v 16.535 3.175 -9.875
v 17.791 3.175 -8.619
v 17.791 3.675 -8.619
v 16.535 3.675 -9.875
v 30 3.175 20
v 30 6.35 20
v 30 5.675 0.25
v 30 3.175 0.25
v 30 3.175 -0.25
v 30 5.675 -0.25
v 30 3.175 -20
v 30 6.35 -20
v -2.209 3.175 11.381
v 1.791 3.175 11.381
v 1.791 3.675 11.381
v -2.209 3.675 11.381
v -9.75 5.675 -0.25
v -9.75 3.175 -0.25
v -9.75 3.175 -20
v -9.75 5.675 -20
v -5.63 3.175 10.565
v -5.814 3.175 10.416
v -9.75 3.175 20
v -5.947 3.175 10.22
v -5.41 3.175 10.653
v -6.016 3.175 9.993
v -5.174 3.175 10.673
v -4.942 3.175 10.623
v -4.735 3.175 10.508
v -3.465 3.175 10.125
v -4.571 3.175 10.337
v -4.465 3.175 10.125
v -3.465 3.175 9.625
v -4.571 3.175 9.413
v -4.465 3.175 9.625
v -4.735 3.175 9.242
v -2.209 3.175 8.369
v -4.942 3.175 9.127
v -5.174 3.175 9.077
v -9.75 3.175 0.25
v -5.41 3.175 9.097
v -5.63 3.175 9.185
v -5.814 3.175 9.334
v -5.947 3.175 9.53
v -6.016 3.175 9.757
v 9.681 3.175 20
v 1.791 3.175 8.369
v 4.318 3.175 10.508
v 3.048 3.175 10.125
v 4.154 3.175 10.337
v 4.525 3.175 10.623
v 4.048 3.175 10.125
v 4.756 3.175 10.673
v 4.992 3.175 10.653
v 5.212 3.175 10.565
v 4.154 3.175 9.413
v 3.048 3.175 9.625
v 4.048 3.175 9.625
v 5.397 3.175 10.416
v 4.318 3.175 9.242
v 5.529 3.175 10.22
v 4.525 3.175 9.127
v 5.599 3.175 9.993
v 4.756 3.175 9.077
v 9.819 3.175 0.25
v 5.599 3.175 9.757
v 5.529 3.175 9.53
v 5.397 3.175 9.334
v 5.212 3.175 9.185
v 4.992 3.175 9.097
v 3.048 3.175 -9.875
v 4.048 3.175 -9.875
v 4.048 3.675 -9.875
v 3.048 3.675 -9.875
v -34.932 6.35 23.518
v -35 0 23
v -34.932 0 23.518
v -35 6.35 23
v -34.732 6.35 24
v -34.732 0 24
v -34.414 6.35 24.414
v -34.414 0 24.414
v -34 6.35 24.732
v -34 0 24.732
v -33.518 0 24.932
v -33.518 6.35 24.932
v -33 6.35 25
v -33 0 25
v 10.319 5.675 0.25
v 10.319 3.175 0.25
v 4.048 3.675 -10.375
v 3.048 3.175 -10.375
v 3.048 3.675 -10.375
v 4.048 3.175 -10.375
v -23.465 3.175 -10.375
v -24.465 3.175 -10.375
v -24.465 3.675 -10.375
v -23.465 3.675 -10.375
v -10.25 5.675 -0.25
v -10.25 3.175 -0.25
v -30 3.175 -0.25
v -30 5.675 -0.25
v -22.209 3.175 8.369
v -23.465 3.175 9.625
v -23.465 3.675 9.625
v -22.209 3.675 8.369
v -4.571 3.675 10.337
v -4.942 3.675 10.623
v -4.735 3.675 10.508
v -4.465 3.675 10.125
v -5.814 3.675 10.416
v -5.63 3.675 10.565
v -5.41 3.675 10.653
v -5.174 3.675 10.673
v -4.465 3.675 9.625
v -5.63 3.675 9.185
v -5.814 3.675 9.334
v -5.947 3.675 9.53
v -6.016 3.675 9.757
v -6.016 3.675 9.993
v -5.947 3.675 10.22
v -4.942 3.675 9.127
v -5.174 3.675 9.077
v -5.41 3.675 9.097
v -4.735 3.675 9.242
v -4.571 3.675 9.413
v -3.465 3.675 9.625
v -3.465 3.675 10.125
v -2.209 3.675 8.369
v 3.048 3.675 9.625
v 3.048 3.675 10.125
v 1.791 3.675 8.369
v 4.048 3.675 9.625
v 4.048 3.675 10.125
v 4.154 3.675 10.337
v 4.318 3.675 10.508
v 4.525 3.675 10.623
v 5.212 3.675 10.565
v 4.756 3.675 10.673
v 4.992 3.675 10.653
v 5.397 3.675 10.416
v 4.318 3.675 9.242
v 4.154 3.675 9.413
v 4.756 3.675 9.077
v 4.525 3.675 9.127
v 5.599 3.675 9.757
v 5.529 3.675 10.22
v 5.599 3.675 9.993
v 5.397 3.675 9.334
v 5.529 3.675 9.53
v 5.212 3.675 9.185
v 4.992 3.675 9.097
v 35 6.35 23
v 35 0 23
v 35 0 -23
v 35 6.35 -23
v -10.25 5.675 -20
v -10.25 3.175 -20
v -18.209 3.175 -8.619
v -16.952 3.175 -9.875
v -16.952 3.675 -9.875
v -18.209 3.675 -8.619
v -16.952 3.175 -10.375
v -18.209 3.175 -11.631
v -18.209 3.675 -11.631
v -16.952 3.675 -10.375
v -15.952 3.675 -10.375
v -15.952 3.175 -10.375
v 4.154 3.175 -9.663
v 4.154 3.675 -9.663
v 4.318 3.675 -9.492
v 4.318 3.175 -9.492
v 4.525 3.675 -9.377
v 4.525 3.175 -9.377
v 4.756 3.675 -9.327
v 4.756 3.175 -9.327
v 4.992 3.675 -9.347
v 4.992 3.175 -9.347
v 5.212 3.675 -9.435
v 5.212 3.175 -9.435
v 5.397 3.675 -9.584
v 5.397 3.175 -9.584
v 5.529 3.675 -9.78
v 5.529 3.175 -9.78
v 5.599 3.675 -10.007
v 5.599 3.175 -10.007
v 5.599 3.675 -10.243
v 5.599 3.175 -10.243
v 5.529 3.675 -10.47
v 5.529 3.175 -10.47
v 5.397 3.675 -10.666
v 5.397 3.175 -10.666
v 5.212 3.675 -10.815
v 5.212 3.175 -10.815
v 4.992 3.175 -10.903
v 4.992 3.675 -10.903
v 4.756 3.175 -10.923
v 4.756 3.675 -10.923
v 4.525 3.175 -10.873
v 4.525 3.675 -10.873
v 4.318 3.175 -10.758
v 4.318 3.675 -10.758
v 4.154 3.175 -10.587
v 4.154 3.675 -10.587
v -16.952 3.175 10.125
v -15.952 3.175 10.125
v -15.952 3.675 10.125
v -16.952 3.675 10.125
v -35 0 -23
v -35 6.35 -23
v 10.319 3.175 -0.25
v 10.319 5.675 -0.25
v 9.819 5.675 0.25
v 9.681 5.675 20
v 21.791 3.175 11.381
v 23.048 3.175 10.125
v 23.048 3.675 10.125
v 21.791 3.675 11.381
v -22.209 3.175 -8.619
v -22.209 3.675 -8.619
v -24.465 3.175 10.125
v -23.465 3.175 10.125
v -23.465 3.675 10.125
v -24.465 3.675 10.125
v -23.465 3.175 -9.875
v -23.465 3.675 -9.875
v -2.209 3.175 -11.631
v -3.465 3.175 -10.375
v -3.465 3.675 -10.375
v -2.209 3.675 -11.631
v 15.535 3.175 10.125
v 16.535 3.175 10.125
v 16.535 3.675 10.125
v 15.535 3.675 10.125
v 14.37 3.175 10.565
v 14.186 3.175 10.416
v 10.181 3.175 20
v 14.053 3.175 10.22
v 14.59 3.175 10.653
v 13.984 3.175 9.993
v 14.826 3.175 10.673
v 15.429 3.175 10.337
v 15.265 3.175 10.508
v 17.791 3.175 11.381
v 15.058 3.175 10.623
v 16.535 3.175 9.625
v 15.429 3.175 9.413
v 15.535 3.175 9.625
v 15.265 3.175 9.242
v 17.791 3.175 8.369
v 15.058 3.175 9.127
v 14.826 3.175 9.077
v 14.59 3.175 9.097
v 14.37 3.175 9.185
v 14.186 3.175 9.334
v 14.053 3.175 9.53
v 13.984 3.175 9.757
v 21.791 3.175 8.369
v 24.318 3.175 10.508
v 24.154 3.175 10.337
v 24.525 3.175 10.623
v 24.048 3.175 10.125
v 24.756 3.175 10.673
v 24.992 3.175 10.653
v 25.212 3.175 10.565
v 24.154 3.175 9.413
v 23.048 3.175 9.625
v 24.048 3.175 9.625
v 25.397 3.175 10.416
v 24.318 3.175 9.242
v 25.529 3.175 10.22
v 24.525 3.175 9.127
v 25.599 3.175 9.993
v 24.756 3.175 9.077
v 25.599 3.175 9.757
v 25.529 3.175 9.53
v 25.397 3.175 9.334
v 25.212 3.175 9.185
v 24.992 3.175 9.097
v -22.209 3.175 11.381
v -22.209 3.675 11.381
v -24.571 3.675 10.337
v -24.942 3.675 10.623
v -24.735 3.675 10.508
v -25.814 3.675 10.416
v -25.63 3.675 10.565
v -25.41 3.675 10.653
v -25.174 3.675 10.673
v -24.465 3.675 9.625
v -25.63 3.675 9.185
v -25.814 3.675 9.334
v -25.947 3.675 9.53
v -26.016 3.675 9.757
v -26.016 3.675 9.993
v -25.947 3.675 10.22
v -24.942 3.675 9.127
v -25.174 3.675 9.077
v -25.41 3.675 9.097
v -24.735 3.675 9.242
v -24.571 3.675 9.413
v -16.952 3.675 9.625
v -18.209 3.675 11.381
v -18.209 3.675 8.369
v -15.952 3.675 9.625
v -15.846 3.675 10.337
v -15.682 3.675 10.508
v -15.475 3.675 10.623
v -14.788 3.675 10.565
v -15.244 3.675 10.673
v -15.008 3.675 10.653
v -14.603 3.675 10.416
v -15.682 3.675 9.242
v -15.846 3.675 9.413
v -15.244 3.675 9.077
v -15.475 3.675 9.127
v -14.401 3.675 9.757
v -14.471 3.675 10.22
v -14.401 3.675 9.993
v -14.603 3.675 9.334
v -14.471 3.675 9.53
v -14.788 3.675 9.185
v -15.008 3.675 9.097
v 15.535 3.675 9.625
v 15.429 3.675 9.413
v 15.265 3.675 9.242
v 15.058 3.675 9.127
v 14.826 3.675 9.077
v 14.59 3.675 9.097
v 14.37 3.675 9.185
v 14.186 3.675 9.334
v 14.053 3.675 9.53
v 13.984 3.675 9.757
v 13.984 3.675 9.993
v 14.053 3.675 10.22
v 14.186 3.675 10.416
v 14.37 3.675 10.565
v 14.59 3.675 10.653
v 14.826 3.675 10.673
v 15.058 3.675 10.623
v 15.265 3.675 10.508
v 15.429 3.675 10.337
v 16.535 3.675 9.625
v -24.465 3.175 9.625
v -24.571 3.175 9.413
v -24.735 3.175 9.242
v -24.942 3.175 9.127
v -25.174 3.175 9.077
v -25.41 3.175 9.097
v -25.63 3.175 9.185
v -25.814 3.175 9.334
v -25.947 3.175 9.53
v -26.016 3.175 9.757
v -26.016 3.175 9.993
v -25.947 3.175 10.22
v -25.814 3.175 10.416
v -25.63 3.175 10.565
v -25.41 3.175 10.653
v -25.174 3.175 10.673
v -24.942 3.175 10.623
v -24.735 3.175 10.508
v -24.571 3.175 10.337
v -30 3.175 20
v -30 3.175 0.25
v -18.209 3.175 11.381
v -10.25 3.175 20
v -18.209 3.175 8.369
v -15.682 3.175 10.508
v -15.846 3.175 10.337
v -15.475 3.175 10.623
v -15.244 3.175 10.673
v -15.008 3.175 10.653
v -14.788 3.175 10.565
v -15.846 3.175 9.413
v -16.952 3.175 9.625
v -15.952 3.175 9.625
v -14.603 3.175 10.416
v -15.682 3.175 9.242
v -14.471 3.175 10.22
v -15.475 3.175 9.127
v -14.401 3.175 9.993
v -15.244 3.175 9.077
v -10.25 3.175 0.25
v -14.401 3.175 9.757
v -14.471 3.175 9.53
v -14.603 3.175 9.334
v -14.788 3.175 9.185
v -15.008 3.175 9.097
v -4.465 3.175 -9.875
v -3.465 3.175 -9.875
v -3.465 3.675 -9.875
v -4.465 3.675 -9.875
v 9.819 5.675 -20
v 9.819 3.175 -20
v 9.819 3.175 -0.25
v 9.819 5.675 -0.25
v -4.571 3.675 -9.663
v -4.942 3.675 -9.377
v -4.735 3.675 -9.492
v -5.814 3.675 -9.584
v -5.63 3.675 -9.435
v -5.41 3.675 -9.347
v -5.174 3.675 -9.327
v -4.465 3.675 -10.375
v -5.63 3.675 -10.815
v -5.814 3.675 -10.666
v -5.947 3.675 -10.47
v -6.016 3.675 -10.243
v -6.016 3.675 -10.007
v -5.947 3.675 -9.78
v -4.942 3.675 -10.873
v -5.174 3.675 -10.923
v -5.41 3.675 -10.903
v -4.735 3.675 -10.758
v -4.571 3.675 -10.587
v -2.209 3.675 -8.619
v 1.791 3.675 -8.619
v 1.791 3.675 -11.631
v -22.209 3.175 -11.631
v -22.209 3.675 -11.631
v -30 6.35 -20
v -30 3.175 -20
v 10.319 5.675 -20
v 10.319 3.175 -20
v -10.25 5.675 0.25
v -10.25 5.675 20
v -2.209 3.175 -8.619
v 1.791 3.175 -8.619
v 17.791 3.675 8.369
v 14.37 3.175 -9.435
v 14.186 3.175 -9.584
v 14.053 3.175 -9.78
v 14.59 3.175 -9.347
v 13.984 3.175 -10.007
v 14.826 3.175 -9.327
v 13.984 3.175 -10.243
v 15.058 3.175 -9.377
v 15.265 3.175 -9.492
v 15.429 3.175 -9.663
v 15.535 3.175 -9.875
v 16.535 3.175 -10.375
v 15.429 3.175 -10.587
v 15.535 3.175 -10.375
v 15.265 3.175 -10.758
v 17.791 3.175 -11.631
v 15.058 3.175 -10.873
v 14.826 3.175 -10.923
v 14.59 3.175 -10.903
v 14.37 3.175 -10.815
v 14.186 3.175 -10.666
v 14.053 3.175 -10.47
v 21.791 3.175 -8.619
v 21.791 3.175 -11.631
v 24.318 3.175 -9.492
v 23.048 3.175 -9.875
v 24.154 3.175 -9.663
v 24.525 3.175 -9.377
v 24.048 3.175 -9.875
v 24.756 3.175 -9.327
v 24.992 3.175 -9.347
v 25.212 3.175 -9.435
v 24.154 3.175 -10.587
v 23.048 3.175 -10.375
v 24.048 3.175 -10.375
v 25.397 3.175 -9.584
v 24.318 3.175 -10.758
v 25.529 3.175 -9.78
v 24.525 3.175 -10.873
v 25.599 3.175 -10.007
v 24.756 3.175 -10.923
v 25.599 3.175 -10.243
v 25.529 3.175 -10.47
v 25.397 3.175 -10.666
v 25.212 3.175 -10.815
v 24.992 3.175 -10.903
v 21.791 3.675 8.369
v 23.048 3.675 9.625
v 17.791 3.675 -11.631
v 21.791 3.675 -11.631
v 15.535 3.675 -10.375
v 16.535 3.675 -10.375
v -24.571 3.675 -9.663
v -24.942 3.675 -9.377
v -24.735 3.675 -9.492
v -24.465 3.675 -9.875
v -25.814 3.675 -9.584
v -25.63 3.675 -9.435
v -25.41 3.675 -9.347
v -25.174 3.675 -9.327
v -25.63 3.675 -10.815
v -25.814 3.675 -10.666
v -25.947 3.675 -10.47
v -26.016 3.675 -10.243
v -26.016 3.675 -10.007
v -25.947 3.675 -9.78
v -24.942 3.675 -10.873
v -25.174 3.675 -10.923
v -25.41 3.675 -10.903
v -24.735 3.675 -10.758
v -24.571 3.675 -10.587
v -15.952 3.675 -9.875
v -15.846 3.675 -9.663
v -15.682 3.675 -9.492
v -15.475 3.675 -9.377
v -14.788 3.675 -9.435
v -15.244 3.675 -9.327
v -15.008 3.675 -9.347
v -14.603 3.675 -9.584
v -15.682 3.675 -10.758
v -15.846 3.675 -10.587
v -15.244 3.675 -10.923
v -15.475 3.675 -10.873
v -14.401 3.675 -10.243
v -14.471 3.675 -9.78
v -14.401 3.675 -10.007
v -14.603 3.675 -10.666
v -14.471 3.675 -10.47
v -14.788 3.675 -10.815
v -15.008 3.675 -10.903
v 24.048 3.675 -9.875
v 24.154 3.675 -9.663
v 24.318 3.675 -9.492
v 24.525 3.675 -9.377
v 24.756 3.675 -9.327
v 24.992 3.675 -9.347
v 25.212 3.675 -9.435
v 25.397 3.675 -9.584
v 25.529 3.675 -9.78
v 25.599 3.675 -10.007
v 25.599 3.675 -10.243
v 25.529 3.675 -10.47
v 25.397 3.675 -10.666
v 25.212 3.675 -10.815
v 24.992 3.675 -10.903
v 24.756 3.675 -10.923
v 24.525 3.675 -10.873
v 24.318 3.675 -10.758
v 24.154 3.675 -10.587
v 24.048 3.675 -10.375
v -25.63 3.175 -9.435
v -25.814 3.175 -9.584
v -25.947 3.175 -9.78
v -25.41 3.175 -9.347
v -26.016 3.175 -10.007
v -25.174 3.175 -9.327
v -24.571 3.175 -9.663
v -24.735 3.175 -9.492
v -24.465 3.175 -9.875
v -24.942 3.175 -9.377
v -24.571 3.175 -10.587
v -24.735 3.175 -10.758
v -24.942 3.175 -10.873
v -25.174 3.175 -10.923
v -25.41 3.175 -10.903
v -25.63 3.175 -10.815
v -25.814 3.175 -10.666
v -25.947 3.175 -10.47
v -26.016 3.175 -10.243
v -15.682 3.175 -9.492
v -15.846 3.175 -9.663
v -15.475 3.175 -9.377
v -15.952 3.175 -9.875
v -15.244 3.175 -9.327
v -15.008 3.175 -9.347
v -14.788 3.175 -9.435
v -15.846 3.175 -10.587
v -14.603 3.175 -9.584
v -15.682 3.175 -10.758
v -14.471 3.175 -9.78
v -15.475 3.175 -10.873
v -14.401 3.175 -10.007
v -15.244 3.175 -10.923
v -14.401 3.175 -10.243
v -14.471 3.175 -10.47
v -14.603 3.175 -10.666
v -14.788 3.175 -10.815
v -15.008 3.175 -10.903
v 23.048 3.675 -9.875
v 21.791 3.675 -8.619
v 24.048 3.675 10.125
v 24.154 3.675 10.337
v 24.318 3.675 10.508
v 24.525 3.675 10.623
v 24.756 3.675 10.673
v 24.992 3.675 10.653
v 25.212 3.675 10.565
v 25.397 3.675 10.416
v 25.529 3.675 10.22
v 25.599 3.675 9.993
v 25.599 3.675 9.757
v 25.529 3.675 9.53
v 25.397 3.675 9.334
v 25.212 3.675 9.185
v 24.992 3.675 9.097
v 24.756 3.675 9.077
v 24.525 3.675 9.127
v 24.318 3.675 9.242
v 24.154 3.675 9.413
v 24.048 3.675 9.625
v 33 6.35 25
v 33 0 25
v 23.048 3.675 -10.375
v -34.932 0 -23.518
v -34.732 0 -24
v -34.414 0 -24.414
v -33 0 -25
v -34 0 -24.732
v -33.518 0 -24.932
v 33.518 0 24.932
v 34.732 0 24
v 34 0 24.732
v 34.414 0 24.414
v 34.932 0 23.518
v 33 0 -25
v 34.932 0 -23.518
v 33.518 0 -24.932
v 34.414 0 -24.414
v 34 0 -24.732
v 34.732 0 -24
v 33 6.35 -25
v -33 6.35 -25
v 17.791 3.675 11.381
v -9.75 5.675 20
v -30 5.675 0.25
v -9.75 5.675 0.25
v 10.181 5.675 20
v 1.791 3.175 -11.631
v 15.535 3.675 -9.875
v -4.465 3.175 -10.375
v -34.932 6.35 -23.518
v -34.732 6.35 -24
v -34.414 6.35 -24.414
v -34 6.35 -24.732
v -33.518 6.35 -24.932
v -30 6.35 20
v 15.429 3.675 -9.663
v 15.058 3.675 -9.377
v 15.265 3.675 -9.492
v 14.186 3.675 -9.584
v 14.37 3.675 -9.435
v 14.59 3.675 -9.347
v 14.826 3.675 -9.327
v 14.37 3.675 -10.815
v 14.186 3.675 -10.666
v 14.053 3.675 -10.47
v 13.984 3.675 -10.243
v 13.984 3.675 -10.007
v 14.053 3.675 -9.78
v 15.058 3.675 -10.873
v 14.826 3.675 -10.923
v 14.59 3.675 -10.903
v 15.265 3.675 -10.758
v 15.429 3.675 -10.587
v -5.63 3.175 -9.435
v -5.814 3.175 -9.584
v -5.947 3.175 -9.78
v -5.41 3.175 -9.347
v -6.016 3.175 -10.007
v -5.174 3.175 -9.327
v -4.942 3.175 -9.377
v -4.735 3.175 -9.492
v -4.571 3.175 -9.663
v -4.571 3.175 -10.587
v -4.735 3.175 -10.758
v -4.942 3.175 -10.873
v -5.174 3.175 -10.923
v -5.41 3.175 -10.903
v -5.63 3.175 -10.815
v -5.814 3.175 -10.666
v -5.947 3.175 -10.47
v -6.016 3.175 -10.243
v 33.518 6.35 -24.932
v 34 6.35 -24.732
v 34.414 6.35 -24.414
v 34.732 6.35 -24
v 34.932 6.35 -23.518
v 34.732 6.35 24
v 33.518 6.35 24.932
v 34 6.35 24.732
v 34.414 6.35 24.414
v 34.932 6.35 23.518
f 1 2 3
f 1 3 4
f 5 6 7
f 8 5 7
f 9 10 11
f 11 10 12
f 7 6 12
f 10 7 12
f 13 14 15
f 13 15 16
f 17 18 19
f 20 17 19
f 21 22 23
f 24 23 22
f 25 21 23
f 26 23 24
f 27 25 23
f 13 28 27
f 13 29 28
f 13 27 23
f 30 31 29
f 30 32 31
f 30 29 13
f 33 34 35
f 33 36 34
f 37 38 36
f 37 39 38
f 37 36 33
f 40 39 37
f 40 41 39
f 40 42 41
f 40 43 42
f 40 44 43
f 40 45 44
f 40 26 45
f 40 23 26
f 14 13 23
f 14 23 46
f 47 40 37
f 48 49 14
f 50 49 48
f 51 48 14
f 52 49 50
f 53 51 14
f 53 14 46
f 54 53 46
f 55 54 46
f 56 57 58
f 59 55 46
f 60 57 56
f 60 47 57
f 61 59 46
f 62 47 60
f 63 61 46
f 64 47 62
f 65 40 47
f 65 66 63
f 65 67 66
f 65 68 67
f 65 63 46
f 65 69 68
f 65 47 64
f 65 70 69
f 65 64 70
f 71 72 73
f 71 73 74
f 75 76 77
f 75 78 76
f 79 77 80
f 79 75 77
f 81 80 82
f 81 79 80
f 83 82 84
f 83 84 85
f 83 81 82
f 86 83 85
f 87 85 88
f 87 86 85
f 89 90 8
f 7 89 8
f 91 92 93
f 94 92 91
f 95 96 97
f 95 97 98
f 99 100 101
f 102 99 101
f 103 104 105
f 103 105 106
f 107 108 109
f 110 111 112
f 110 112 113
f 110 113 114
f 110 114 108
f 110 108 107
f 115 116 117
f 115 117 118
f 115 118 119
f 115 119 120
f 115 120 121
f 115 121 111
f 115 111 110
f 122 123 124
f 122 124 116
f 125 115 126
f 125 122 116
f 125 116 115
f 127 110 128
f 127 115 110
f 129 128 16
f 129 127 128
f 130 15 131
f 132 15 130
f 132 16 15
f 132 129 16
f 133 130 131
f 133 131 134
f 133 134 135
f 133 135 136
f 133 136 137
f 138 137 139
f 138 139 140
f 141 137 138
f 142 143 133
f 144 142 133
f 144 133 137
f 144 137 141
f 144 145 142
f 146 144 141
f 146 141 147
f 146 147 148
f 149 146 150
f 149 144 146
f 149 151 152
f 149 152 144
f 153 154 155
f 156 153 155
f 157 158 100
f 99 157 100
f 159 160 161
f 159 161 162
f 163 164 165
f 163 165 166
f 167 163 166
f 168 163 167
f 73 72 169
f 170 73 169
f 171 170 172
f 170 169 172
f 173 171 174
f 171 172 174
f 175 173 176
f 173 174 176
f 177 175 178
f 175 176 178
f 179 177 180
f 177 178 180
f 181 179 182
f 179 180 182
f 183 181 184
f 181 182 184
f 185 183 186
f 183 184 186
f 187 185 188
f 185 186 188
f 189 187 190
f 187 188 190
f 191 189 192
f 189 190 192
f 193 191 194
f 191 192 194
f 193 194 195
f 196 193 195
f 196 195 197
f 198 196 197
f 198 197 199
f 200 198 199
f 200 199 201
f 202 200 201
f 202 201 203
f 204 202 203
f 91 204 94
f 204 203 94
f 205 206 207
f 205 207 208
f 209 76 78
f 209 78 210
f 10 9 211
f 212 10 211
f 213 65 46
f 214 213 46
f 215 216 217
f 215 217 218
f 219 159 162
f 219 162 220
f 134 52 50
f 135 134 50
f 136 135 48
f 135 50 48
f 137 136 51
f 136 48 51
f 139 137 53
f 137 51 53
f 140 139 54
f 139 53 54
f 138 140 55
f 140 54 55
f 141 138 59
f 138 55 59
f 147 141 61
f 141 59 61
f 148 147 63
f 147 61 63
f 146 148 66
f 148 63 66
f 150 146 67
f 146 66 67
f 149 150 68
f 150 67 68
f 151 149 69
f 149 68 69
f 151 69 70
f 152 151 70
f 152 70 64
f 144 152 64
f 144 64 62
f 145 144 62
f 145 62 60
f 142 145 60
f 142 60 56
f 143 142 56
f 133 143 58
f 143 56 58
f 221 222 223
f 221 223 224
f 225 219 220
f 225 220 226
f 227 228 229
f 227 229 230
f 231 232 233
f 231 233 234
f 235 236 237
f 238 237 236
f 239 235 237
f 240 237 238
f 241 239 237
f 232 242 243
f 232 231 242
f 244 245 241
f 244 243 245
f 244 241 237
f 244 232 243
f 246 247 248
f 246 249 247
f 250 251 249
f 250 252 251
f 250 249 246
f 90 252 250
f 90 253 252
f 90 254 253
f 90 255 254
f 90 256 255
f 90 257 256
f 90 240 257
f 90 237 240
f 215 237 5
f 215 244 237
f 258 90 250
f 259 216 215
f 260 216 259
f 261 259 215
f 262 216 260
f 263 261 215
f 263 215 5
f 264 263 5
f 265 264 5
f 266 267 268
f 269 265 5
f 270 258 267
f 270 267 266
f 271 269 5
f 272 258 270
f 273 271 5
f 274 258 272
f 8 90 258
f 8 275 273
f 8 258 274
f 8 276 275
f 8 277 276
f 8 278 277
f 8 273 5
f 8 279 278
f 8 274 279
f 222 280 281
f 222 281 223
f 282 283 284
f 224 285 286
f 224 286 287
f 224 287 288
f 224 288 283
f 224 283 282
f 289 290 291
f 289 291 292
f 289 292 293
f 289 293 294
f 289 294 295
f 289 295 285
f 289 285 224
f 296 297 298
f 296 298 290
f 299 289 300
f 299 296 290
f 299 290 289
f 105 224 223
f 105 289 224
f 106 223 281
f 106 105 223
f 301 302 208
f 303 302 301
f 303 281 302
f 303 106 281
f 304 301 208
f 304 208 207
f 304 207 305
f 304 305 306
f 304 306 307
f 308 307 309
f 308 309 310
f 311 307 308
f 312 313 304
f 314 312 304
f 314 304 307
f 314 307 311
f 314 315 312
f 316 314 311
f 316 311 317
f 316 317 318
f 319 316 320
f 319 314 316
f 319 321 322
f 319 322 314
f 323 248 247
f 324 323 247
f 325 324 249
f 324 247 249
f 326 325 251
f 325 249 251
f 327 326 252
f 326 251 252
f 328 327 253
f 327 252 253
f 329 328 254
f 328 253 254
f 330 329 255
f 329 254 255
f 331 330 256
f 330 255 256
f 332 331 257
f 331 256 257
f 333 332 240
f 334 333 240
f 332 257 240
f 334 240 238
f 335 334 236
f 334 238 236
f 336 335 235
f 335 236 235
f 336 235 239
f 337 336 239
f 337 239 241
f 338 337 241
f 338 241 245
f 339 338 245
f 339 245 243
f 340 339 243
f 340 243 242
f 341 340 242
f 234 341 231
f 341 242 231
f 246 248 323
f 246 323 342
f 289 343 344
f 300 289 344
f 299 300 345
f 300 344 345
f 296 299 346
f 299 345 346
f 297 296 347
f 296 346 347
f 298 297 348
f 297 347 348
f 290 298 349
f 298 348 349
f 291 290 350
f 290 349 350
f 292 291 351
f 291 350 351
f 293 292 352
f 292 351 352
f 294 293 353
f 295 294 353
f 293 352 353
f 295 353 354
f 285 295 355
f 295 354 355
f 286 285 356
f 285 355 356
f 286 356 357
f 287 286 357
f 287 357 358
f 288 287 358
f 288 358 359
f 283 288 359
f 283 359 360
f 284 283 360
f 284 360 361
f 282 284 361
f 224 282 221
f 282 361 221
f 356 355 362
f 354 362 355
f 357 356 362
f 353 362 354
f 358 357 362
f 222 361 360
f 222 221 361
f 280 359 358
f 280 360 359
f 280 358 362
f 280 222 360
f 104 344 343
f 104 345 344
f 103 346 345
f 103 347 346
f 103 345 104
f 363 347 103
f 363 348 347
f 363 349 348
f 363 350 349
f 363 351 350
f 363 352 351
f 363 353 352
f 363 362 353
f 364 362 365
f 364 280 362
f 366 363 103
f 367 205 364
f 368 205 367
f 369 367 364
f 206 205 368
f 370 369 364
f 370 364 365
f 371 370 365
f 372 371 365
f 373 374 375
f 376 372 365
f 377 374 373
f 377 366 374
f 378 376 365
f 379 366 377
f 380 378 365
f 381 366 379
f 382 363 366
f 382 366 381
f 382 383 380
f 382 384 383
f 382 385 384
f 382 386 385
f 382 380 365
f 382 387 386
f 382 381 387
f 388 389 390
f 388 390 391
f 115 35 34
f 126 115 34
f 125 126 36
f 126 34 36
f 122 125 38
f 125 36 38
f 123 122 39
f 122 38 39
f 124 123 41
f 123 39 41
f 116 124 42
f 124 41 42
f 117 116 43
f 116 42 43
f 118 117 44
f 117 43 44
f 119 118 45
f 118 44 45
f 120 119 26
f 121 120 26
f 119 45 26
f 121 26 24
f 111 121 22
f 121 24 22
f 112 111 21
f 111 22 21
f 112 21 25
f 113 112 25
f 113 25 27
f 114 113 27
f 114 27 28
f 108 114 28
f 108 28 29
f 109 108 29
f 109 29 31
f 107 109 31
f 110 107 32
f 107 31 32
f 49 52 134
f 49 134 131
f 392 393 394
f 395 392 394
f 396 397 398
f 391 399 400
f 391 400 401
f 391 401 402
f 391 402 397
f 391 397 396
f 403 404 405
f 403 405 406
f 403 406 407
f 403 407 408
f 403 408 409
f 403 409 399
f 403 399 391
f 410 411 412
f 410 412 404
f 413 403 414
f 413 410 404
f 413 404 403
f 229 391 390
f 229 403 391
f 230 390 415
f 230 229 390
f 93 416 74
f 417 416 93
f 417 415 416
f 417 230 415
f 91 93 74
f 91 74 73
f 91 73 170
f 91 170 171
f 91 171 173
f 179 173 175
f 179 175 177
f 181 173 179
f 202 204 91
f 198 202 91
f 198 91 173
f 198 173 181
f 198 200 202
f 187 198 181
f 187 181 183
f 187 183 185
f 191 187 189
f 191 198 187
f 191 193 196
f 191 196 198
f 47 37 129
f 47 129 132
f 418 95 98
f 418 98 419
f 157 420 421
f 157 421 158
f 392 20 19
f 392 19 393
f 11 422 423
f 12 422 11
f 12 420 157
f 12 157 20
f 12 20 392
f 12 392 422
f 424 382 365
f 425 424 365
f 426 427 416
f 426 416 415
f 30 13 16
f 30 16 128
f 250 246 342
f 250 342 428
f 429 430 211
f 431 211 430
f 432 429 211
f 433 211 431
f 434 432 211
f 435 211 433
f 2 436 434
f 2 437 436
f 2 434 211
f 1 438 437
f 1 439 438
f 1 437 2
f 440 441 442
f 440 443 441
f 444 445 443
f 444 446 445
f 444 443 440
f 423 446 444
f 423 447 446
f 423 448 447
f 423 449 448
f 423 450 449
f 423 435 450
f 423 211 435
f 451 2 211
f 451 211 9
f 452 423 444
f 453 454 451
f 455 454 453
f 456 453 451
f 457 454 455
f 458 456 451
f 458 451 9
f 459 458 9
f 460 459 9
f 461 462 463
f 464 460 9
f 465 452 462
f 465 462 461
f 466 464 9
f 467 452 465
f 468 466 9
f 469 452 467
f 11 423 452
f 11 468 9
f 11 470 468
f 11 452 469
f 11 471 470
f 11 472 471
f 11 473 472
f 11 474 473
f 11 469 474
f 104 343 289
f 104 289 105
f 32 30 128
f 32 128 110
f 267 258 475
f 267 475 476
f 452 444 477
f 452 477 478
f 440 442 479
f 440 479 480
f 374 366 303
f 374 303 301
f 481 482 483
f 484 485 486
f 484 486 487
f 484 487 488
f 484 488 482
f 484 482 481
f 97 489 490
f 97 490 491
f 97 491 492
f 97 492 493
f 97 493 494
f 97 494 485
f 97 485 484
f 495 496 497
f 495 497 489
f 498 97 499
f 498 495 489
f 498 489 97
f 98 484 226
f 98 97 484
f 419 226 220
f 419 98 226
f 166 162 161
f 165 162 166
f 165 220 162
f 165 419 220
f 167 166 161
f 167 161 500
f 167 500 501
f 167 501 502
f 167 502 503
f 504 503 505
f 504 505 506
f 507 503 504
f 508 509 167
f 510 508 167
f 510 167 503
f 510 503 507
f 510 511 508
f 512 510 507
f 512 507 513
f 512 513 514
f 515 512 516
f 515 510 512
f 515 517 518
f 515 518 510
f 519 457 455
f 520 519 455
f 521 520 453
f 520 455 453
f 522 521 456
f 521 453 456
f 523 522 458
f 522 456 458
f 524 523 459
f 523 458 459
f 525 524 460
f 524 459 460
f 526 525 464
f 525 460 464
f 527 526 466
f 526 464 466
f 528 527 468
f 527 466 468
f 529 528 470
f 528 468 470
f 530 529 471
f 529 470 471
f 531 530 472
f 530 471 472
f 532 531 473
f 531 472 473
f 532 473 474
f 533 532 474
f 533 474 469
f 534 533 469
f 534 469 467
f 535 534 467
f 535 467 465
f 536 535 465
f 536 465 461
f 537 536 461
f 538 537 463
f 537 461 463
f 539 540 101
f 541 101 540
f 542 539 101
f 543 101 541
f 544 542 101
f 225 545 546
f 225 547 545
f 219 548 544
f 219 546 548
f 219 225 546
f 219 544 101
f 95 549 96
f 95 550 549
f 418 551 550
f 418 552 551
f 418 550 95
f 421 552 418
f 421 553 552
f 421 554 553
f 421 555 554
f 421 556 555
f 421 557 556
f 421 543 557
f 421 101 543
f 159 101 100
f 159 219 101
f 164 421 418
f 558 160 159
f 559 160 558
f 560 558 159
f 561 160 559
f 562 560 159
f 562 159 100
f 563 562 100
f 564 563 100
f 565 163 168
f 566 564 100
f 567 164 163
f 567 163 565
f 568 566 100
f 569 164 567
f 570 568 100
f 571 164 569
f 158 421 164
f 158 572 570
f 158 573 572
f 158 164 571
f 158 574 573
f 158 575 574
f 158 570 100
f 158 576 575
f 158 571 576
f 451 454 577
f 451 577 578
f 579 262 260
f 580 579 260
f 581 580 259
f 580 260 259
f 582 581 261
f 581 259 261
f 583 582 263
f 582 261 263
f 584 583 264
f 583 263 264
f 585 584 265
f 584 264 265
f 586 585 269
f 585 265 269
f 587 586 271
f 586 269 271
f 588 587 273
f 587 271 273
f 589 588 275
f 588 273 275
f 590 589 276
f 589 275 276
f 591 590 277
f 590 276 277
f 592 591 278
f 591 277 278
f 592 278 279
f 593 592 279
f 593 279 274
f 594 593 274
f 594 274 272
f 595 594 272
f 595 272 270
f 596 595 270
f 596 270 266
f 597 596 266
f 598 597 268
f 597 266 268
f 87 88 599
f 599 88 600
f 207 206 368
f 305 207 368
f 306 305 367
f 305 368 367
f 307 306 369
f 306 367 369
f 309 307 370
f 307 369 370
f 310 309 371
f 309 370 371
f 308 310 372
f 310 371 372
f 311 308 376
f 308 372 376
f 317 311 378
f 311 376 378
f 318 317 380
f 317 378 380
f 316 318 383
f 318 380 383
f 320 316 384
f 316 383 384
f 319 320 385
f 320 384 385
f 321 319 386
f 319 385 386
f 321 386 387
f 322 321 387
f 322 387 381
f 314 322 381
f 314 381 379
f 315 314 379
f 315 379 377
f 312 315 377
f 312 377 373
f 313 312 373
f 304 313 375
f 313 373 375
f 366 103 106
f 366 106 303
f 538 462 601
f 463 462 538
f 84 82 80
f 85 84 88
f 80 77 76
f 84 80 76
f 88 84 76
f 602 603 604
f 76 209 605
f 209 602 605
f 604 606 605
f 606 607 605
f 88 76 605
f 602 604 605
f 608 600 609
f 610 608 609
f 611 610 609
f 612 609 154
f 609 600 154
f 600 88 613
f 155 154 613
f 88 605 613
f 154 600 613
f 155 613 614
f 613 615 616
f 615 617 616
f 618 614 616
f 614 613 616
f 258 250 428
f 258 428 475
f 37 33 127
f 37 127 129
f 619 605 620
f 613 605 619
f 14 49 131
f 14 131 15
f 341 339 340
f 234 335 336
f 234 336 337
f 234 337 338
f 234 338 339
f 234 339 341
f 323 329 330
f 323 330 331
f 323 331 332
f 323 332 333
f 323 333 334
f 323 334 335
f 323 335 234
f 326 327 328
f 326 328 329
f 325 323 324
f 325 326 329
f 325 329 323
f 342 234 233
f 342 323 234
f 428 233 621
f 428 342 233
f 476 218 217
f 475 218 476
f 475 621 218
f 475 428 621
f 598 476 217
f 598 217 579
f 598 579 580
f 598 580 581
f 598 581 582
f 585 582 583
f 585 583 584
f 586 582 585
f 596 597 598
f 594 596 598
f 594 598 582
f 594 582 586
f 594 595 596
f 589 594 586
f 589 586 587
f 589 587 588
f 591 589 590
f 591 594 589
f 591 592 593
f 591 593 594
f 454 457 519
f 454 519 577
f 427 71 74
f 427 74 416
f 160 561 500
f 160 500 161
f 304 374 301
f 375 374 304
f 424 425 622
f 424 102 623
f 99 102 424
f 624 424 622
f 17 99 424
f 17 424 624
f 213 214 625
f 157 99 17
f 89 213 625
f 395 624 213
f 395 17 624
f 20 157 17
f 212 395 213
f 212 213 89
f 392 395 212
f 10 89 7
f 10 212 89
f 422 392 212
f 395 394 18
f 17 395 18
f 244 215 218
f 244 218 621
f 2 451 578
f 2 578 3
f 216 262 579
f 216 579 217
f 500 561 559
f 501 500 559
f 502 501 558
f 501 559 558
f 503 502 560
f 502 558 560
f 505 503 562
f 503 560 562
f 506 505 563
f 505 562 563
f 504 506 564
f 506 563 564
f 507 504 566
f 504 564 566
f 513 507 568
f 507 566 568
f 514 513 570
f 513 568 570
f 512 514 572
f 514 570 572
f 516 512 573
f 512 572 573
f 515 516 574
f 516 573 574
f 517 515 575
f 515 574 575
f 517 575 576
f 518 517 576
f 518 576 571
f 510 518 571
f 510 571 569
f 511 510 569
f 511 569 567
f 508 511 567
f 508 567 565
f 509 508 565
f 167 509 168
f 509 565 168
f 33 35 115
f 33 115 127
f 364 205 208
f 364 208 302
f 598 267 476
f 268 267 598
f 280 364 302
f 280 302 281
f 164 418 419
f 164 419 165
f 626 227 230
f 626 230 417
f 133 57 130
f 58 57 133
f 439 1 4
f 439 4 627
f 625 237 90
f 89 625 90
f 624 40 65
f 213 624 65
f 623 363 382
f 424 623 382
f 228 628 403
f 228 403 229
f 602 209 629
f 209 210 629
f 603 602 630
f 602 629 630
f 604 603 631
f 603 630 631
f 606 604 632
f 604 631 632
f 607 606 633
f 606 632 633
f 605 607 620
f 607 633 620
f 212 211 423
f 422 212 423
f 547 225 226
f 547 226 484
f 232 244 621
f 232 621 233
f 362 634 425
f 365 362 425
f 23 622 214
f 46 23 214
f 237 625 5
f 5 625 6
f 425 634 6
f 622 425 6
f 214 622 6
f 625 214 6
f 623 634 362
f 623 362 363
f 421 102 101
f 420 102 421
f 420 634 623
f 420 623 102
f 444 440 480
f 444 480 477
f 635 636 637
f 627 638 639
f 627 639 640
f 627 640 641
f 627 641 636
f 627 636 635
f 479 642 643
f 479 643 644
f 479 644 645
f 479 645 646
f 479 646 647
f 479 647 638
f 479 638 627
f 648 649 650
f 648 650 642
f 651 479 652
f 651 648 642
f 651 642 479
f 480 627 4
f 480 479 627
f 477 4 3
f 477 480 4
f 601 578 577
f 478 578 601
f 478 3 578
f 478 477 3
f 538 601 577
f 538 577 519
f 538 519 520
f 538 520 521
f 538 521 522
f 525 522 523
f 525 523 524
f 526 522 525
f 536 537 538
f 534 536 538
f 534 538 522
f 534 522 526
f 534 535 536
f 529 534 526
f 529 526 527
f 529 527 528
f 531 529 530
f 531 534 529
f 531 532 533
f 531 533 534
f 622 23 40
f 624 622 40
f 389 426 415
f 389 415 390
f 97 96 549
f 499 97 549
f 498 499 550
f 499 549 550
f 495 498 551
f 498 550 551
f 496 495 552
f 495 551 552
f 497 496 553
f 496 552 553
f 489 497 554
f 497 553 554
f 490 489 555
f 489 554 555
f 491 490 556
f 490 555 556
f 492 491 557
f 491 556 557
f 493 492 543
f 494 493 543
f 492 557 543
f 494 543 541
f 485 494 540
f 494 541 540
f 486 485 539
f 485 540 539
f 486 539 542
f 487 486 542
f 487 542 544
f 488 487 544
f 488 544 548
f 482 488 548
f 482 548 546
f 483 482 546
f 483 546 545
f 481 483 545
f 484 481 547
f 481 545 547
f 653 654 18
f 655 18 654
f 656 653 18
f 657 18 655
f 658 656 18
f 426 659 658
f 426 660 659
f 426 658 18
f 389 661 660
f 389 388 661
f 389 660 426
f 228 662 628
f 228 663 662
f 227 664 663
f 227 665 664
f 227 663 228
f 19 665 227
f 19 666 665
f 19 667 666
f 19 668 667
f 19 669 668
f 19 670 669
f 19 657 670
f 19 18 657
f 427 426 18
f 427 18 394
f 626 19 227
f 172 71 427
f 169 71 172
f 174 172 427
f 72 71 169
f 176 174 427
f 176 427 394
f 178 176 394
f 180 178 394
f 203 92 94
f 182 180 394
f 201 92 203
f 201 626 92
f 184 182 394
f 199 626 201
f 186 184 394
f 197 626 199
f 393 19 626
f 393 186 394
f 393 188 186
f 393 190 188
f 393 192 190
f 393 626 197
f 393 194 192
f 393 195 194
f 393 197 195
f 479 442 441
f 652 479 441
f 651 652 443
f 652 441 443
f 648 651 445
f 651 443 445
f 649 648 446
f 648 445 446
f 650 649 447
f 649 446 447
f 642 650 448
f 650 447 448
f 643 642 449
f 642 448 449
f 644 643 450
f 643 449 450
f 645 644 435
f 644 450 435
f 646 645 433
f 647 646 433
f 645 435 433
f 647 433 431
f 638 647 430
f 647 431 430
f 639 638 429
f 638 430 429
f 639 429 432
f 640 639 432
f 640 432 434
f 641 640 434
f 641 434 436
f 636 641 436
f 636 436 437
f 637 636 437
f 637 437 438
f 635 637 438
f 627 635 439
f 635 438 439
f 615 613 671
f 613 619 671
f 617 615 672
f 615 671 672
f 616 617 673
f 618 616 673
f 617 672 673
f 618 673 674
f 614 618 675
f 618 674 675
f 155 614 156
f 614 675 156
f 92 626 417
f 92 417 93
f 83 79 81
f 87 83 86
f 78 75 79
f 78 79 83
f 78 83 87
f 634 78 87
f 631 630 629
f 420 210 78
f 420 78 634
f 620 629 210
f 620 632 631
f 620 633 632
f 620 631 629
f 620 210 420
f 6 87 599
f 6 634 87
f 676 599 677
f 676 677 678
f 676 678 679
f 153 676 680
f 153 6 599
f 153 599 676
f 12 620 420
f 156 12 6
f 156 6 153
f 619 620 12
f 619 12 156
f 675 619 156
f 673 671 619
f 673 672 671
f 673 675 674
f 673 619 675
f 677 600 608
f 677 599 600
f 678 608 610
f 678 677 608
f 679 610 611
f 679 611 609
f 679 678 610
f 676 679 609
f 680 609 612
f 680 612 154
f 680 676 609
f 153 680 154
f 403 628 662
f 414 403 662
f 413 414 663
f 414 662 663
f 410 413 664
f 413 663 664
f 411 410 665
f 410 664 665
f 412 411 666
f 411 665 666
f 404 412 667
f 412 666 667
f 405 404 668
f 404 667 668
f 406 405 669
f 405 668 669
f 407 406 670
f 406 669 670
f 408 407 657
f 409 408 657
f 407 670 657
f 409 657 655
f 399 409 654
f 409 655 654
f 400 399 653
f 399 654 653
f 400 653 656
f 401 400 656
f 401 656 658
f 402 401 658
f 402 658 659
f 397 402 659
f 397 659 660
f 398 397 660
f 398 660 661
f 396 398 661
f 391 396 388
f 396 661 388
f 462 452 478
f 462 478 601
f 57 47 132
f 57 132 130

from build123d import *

# Parameters (mm, degrees)
SKETCH1_W            = 70
SKETCH1_H            = 50
BOSS_EXTRUDE1_DEPTH  = 6.35
SKETCH2_W            = 60
SKETCH2_H            = 40
CUT_EXTRUDE1_DEPTH   = 3.175
DIVIDERS_DEPTH       = 2.5
BOSS_EXTRUDE3_DEPTH  = 0.5
LPATTERN1_COUNT      = 3
LPATTERN1_PITCH      = 20
LPATTERN1_COUNT_DIR2 = 2
LPATTERN1_PITCH_DIR2 = 20
FILLET1_R            = 2


with BuildPart() as part:
    # Sketch1 → Boss-Extrude1 (new body)
    with BuildSketch(Plane(origin=(0, 0, 0), x_dir=(1, 0, 0), z_dir=(0, 1, 0))):
        Rectangle(SKETCH1_W, SKETCH1_H)
    extrude(amount=BOSS_EXTRUDE1_DEPTH)

    # Sketch2 → Cut-Extrude1 (cut)
    with BuildSketch(Plane(origin=(0, 6.35, 0), x_dir=(1, 0, 0), z_dir=(0, 1, 0))):
        Rectangle(SKETCH2_W, SKETCH2_H)
    extrude(amount=-CUT_EXTRUDE1_DEPTH, mode=Mode.SUBTRACT)

    # Sketch10 → Dividers (add)
    with BuildSketch(Plane(origin=(0, 3.175, 0), x_dir=(1, 0, 0), z_dir=(0, 1, 0))):
        Polygon((-10.25, -0.25), (-10.25, -20), (-9.75, -20), (-9.75, -0.25), (9.818560524, -0.25), (9.681439476, -20), (10.181439476, -20), (10.318560524, -0.25), (30, -0.25), (30, 0.25), (10.318560524, 0.25), (10.318560524, 20), (9.818560524, 20), (9.818560524, 0.25), (-9.75, 0.25), (-9.75, 20), (-10.25, 20), (-10.25, 0.25), (-30, 0.25), (-30, -0.25), align=None)
    extrude(amount=DIVIDERS_DEPTH)

    # Sketch11 → Boss-Extrude3 (add)
    with BuildSketch(Plane(origin=(0, 3.175, 0), x_dir=(1, 0, 0), z_dir=(0, 1, 0))):
        with BuildLine():
            Line((-24.464905709, 9.875), (-24.464905709, 10.375))
            ThreePointArc((-24.464905709, 10.375), (-26.024839917, 10.125), (-24.464905709, 9.875))
        make_face()
        Polygon((-24.464905709, 9.875), (-24.464905709, 10.375), (-23.464905709, 10.375), (-22.208630276, 11.631275433), (-18.208630276, 11.631275433), (-16.952354844, 10.375), (-15.952354844, 10.375), (-15.952354844, 9.875), (-16.952354844, 9.875), (-18.208630276, 8.618724567), (-22.208630276, 8.618724567), (-23.464905709, 9.875), align=None)
        with BuildLine():
            Line((-15.952354844, 10.375), (-15.952354844, 9.875))
            ThreePointArc((-15.952354844, 9.875), (-14.392420636, 10.125), (-15.952354844, 10.375))
        make_face()
    boss_extrude3 = extrude(amount=BOSS_EXTRUDE3_DEPTH)

    # LPattern1: Boss-Extrude3 3 × 2
    with Locations(*[(i * LPATTERN1_PITCH, 0, j * LPATTERN1_PITCH_DIR2) for i in range(LPATTERN1_COUNT) for j in range(LPATTERN1_COUNT_DIR2) if (i, j) != (0, 0)]):
        add(boss_extrude3)

    # Fillet1
    fillet1_edges = [part.edges().sort_by_distance(p)[0] for p in [
        (35, 3.175, 25),
        (-35, 3.175, 25),
        (-35, 3.175, -25),
        (35, 3.175, -25),
    ]]
    fillet(fillet1_edges, radius=FILLET1_R)


solid = part.part
